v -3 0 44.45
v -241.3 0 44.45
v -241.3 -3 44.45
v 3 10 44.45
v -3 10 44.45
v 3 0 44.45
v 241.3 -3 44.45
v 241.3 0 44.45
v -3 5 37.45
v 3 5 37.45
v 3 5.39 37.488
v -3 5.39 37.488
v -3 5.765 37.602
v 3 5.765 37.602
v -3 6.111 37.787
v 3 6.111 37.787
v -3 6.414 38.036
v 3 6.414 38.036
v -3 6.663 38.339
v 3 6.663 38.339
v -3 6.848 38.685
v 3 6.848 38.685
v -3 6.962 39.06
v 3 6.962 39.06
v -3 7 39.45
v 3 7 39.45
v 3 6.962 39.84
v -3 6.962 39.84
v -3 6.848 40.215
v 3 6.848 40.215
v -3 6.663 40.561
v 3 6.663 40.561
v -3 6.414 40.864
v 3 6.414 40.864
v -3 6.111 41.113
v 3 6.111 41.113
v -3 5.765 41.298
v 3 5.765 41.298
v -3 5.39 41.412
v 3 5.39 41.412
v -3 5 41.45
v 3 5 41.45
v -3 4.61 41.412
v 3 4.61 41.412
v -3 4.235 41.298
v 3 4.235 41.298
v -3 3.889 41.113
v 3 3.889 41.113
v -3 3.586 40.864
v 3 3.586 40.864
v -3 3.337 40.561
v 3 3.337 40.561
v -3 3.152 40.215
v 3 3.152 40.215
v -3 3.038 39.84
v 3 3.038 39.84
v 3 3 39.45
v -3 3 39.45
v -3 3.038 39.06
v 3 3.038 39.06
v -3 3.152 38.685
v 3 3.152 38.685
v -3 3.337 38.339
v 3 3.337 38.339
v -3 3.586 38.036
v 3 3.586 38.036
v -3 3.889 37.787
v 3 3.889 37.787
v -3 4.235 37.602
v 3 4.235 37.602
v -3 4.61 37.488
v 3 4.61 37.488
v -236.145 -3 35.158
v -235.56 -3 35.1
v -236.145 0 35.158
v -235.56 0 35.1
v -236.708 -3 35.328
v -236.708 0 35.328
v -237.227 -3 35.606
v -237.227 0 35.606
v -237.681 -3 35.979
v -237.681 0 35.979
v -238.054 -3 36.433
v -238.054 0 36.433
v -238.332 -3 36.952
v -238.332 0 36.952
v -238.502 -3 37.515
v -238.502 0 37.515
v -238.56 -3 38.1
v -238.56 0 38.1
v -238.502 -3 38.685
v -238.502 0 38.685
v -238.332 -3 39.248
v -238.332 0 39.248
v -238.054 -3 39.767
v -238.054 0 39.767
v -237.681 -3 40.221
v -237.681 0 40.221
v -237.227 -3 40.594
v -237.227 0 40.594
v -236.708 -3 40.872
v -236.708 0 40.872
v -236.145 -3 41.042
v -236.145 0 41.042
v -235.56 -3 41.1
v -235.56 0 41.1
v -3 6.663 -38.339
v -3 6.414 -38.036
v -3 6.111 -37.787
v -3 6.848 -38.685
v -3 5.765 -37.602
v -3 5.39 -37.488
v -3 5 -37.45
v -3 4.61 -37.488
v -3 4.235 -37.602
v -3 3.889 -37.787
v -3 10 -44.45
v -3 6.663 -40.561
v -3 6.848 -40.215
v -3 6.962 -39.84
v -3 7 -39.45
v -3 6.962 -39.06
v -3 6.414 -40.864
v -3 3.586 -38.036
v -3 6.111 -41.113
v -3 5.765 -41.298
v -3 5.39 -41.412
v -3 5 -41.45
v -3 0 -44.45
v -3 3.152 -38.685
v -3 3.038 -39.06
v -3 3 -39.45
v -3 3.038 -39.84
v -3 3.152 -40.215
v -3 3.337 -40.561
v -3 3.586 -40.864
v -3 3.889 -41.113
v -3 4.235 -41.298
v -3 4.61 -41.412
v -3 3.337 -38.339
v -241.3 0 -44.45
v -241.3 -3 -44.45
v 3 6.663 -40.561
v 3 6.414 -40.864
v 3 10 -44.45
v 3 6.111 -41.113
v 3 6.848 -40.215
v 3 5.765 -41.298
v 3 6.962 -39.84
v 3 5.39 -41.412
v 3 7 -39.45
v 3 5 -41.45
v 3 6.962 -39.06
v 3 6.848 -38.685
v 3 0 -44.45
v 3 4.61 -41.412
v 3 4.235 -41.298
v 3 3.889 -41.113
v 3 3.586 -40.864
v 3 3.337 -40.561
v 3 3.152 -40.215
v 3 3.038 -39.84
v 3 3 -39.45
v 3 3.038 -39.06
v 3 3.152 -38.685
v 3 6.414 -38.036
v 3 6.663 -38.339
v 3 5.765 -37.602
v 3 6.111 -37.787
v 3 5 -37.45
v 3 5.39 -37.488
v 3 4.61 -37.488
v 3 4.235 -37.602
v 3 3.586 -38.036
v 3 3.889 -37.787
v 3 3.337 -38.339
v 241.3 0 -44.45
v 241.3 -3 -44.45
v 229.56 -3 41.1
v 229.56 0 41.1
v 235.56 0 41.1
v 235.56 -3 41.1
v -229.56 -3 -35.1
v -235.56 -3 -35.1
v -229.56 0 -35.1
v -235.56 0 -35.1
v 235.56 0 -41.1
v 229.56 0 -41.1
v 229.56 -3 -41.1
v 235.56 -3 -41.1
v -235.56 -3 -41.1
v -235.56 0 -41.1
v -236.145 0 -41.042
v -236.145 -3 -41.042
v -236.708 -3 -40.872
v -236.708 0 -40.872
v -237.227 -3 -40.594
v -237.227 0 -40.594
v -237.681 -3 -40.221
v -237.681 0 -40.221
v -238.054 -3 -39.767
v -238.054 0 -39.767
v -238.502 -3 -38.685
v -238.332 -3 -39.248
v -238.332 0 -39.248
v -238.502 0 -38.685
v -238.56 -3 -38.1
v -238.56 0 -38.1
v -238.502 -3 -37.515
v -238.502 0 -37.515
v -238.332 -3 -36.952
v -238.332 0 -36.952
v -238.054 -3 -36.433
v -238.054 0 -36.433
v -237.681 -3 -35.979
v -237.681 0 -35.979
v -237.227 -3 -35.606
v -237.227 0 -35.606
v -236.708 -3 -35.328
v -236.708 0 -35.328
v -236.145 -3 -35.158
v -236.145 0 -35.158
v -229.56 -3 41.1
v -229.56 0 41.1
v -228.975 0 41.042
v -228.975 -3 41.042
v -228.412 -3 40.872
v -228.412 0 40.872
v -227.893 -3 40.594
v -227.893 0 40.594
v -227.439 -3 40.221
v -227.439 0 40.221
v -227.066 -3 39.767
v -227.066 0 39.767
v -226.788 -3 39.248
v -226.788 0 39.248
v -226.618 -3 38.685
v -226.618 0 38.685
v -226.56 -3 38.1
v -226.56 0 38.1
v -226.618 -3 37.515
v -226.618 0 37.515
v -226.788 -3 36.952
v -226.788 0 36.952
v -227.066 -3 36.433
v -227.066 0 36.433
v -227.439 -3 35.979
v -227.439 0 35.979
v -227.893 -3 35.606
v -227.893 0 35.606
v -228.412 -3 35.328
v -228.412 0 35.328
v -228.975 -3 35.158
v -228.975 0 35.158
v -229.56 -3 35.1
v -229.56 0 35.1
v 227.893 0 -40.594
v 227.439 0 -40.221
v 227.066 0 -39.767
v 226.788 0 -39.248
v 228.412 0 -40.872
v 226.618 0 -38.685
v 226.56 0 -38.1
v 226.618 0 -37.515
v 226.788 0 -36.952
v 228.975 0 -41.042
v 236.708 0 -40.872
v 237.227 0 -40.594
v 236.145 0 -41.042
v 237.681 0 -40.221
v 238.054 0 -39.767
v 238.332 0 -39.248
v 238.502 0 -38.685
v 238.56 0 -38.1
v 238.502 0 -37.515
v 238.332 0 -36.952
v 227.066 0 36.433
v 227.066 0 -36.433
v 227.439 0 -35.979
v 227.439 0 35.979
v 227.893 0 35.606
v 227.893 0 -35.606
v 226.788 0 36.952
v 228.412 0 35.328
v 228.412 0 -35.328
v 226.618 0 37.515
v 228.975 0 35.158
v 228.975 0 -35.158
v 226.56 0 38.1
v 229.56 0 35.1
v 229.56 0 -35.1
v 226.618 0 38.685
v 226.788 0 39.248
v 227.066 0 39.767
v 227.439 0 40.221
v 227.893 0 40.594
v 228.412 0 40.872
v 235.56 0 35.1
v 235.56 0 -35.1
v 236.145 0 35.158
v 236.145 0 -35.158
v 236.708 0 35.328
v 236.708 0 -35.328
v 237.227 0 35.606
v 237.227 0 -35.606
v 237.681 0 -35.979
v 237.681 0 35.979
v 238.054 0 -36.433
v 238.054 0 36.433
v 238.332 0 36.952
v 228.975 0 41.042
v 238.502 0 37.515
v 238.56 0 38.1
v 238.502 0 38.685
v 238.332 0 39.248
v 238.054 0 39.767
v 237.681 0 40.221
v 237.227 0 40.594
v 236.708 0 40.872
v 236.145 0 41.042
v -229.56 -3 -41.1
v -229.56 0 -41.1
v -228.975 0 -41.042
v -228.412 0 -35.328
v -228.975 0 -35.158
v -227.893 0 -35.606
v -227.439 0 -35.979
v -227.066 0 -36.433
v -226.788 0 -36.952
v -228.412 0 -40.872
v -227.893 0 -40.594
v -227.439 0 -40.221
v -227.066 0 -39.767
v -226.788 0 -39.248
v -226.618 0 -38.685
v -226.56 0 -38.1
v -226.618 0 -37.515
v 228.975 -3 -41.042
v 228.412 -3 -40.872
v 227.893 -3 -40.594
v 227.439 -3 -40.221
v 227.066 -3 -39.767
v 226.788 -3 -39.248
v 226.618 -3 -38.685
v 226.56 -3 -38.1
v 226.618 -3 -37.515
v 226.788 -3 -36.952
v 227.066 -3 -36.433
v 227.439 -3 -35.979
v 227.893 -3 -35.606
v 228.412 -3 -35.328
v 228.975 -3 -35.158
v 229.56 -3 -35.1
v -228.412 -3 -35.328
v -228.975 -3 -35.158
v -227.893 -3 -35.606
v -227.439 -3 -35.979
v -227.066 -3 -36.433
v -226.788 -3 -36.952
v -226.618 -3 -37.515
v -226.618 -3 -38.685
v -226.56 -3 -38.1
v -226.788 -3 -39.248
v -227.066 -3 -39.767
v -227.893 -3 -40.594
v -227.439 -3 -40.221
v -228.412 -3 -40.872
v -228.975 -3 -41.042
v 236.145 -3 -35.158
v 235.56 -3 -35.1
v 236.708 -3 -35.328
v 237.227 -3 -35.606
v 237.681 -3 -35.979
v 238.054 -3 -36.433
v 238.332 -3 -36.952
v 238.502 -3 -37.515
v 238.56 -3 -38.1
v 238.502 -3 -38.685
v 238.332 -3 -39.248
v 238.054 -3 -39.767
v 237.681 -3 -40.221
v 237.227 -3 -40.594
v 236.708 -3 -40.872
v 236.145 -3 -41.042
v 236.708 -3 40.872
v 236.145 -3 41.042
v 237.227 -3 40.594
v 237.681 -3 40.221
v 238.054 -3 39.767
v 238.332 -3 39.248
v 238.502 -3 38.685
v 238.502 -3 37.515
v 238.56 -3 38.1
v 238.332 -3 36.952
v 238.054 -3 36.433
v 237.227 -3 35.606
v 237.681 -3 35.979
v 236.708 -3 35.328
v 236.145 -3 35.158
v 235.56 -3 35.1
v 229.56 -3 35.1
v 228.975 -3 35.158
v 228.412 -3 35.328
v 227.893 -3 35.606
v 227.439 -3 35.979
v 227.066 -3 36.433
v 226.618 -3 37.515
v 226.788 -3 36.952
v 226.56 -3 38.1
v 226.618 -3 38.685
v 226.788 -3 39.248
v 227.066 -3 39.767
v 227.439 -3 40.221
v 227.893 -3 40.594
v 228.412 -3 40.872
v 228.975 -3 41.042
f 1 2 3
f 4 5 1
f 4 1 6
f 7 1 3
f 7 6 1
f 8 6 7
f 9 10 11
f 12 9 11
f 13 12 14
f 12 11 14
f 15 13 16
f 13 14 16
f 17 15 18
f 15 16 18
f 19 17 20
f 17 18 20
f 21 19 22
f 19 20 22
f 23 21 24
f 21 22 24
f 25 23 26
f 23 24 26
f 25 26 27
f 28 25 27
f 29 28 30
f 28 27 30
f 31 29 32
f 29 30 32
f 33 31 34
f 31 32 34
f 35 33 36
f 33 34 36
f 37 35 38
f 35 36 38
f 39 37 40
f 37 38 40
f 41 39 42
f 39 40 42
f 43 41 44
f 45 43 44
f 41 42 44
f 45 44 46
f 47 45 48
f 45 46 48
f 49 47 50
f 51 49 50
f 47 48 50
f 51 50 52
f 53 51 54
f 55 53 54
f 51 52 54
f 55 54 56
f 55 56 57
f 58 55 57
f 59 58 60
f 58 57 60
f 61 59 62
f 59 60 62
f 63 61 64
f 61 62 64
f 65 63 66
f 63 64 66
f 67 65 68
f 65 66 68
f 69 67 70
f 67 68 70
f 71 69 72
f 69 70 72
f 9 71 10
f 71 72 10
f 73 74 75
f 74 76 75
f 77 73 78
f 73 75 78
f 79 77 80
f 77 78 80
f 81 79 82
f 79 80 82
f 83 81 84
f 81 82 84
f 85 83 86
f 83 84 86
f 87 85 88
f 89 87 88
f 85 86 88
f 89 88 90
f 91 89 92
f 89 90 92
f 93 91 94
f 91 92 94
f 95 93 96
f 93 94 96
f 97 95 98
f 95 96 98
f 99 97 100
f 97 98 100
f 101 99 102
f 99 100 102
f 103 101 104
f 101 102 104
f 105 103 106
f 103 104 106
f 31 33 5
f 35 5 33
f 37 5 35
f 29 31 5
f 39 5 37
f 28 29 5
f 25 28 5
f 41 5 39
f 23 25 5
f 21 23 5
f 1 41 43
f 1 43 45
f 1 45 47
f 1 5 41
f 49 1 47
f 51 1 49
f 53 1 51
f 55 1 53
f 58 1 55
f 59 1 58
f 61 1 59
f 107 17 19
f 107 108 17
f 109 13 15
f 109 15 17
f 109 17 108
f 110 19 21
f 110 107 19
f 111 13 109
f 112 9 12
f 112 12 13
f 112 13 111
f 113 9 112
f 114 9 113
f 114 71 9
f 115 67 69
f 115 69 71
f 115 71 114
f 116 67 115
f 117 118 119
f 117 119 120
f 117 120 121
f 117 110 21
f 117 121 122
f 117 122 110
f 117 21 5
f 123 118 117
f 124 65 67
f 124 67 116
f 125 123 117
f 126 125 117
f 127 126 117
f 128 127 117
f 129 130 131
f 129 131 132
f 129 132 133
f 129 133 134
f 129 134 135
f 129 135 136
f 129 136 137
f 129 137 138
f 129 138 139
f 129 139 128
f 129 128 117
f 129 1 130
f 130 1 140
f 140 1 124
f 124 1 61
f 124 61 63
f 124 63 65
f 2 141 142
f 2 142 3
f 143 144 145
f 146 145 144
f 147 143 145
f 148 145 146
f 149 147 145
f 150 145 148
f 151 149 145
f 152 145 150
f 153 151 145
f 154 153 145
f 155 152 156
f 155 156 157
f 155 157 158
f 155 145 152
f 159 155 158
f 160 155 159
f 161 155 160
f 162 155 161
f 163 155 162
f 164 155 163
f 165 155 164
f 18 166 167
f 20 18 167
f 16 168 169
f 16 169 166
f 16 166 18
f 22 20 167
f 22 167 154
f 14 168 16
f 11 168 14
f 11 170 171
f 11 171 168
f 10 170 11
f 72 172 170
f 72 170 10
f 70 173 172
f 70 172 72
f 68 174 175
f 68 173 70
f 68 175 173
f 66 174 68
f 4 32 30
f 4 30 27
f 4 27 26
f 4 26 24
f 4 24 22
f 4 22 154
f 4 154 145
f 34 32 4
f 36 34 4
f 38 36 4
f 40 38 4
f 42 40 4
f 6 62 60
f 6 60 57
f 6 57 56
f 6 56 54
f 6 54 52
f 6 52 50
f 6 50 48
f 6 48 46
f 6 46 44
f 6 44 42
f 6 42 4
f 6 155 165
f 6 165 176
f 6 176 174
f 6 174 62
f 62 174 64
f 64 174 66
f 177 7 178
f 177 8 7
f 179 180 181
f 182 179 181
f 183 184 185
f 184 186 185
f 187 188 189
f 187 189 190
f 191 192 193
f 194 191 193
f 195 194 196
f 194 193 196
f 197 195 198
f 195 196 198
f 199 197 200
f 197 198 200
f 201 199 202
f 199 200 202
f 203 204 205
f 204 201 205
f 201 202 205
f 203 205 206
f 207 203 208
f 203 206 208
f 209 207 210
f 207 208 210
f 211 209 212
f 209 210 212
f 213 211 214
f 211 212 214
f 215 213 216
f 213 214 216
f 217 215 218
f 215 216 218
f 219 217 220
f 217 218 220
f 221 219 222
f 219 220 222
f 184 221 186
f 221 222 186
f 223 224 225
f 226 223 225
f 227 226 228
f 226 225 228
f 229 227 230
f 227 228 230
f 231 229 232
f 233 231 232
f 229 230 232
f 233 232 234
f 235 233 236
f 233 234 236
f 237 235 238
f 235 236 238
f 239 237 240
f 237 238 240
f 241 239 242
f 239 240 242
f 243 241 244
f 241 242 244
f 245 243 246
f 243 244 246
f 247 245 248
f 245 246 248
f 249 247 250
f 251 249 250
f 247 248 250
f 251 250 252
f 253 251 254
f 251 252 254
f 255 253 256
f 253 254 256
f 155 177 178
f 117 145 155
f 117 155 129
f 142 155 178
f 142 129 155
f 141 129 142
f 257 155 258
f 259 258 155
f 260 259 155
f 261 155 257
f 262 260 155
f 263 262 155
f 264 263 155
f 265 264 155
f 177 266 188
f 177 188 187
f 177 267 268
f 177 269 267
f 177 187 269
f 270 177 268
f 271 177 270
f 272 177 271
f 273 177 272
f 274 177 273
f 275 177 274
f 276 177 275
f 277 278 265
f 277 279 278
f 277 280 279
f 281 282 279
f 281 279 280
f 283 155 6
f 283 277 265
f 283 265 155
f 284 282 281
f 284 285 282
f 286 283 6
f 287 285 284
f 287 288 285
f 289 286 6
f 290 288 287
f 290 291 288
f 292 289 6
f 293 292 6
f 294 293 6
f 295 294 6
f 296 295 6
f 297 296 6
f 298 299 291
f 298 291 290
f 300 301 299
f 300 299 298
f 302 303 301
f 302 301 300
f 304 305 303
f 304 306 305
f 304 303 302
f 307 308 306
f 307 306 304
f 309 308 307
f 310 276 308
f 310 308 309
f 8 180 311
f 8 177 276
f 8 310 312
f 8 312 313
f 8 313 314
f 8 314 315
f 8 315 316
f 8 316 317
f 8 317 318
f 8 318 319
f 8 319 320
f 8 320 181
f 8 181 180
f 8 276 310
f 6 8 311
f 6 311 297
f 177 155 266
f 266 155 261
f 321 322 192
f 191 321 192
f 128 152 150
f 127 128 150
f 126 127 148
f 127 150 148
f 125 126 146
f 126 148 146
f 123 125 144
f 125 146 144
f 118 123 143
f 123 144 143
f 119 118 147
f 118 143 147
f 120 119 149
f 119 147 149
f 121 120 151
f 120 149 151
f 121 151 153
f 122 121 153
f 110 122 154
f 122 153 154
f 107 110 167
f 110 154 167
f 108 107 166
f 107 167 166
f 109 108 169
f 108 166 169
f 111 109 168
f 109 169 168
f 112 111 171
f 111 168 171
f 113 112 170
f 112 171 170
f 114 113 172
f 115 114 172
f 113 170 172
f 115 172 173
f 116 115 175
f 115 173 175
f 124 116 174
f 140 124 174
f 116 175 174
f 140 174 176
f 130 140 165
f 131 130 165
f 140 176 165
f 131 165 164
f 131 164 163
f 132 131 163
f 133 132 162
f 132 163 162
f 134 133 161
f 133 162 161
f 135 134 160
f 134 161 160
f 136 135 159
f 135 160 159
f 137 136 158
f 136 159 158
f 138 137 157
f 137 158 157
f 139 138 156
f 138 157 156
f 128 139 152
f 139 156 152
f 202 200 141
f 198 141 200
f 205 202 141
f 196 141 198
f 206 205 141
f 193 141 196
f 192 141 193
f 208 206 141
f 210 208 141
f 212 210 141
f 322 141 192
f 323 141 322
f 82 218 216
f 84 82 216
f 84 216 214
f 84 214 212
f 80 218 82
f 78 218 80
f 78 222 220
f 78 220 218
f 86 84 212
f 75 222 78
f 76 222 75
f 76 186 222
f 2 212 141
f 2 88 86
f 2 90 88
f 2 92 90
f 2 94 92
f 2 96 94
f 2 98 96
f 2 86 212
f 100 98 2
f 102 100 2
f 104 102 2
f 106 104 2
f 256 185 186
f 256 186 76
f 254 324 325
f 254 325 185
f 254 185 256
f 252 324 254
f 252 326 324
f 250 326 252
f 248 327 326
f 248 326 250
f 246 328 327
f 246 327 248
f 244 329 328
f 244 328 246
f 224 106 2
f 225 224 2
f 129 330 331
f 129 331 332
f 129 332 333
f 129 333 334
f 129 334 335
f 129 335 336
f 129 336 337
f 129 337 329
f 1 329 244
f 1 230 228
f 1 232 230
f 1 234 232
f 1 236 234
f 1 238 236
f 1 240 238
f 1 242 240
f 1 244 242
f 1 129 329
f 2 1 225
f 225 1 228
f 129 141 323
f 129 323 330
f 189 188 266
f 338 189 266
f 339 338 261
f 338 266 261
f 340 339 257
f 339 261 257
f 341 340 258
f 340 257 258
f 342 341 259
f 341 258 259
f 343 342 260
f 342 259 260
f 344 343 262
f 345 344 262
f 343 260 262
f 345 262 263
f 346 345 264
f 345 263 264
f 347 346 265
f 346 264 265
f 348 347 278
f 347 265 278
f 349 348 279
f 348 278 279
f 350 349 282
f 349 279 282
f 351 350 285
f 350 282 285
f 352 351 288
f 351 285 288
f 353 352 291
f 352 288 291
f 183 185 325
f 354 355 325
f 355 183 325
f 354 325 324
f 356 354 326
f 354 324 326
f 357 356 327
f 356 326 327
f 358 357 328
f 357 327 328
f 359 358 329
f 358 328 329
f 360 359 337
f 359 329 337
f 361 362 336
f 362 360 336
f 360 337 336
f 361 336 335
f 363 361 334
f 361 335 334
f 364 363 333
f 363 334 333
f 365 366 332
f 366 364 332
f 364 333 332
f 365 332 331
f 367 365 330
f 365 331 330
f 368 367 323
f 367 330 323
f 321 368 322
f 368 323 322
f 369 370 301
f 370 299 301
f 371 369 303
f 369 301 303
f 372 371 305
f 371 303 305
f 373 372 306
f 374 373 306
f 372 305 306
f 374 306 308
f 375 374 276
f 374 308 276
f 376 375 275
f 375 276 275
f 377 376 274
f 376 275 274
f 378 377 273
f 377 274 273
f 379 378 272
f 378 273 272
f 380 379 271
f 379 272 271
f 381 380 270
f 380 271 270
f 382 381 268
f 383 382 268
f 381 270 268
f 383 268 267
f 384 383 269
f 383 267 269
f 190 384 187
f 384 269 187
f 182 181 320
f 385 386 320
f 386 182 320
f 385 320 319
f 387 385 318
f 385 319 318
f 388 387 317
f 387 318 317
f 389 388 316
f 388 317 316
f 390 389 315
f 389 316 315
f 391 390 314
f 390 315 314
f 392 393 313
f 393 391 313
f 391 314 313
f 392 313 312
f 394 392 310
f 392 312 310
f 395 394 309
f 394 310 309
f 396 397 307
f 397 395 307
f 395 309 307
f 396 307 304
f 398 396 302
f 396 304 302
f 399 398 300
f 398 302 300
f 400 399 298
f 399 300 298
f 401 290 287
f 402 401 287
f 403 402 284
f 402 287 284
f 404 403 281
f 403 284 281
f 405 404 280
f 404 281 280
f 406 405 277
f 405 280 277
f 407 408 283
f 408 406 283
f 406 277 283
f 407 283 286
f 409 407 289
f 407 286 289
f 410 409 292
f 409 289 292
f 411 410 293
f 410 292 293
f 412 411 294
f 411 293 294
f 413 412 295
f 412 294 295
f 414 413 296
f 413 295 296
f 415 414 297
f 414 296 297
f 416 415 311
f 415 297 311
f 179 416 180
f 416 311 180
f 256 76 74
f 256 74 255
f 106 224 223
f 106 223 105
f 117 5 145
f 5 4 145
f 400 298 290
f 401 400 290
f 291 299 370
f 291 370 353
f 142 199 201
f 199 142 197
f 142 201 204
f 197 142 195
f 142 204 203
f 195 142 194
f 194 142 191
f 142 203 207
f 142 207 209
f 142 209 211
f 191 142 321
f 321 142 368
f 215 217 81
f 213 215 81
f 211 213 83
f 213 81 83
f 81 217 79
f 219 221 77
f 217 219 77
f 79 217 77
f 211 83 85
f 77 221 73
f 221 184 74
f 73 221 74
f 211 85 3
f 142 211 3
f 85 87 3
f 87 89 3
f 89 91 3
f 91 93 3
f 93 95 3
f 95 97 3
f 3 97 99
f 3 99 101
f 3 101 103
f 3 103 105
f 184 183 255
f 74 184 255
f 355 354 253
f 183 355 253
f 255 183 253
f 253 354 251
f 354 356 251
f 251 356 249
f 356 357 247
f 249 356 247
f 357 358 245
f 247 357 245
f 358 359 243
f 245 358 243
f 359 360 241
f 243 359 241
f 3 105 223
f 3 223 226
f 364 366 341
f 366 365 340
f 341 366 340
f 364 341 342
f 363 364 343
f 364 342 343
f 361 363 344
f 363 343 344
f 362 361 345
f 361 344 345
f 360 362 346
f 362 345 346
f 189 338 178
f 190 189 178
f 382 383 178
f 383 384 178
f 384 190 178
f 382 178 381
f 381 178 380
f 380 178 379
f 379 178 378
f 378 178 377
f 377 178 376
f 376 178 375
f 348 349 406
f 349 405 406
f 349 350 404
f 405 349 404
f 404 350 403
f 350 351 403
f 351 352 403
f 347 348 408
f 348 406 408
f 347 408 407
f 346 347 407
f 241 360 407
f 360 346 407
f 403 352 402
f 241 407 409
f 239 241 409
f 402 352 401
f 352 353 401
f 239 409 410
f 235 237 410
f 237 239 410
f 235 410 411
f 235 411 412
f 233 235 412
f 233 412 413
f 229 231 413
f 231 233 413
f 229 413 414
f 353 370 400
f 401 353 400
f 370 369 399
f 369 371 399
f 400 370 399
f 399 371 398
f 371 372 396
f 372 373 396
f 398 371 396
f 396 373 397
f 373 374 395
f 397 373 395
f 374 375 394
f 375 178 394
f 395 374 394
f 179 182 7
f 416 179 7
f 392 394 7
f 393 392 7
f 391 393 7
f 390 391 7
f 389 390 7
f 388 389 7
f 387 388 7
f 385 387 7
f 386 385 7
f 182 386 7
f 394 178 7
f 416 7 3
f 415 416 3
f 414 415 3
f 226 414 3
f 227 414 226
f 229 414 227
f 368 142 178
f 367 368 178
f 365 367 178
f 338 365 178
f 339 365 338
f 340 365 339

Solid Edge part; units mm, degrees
sketch "Sketch1" plane through (0, 0, 0) normal (0, -1, 0) x (1, 0, 0)
  arc A0 (235.56, 35.1) -> (235.56, 41.1) centre (235.56, 38.1) ccw
  line L0 (229.56, 41.1) -> (235.56, 41.1)
  arc A1 (229.56, 41.1) -> (229.56, 35.1) centre (229.56, 38.1) ccw
  line L1 (235.56, 35.1) -> (229.56, 35.1)
  arc A2 (-235.56, -35.1) -> (-235.56, -41.1) centre (-235.56, -38.1) ccw
  line L2 (-229.56, -41.1) -> (-235.56, -41.1)
  arc A3 (-229.56, -41.1) -> (-229.56, -35.1) centre (-229.56, -38.1) ccw
  line L3 (-235.56, -35.1) -> (-229.56, -35.1)
  line L4 (-241.3, -44.45) -> (-241.3, 44.45)
  line L5 (-241.3, 44.45) -> (241.3, 44.45)
  line L6 (241.3, 44.45) -> (241.3, -44.45)
  line L7 (241.3, -44.45) -> (-241.3, -44.45)
  line L8 (235.56, -35.1) -> (229.56, -35.1)
  arc A4 (229.56, -41.1) -> (229.56, -35.1) centre (229.56, -38.1) cw
  line L9 (229.56, -41.1) -> (235.56, -41.1)
  arc A5 (235.56, -35.1) -> (235.56, -41.1) centre (235.56, -38.1) cw
  line L10 (-235.56, 35.1) -> (-229.56, 35.1)
  arc A6 (-229.56, 41.1) -> (-229.56, 35.1) centre (-229.56, 38.1) cw
  line L11 (-229.56, 41.1) -> (-235.56, 41.1)
  arc A7 (-235.56, 35.1) -> (-235.56, 41.1) centre (-235.56, 38.1) cw
  dimension "D1" = 482.6
  dimension "D2" = 12
  dimension "D3" = 88.9
  dimension "D4" = 6.35
  dimension "D5" = 6
  dimension "D6" = 3
  dimension "D7" = 3
  dimension "D8" = 6
extrude "Protrusion1" add sketch "Sketch1" along normal blind 3
sketch "Sketch2" plane through (0, -3, 0) normal (0, -1, 0) x (1, 0, 0)
  line L0 (0, 44.45) -> (-3, 44.45)
  line L1 (-3, 44.45) -> (-3, -44.45)
  line L2 (-3, -44.45) -> (0, -44.45)
  line L3 (0, -44.45) -> (3, -44.45)
  line L4 (3, -44.45) -> (3, 44.45)
  line L5 (3, 44.45) -> (0, 44.45)
extrude "RackPlateDivider" add sketch "Sketch2" against normal blind 13
hole "Hole1" at (3, 5, 39.45) direction (-1, 0, 0) diameter 4 end up to next
hole "Hole2" at (3, 5, -39.45) direction (-1, 0, 0) diameter 4 end up to next
